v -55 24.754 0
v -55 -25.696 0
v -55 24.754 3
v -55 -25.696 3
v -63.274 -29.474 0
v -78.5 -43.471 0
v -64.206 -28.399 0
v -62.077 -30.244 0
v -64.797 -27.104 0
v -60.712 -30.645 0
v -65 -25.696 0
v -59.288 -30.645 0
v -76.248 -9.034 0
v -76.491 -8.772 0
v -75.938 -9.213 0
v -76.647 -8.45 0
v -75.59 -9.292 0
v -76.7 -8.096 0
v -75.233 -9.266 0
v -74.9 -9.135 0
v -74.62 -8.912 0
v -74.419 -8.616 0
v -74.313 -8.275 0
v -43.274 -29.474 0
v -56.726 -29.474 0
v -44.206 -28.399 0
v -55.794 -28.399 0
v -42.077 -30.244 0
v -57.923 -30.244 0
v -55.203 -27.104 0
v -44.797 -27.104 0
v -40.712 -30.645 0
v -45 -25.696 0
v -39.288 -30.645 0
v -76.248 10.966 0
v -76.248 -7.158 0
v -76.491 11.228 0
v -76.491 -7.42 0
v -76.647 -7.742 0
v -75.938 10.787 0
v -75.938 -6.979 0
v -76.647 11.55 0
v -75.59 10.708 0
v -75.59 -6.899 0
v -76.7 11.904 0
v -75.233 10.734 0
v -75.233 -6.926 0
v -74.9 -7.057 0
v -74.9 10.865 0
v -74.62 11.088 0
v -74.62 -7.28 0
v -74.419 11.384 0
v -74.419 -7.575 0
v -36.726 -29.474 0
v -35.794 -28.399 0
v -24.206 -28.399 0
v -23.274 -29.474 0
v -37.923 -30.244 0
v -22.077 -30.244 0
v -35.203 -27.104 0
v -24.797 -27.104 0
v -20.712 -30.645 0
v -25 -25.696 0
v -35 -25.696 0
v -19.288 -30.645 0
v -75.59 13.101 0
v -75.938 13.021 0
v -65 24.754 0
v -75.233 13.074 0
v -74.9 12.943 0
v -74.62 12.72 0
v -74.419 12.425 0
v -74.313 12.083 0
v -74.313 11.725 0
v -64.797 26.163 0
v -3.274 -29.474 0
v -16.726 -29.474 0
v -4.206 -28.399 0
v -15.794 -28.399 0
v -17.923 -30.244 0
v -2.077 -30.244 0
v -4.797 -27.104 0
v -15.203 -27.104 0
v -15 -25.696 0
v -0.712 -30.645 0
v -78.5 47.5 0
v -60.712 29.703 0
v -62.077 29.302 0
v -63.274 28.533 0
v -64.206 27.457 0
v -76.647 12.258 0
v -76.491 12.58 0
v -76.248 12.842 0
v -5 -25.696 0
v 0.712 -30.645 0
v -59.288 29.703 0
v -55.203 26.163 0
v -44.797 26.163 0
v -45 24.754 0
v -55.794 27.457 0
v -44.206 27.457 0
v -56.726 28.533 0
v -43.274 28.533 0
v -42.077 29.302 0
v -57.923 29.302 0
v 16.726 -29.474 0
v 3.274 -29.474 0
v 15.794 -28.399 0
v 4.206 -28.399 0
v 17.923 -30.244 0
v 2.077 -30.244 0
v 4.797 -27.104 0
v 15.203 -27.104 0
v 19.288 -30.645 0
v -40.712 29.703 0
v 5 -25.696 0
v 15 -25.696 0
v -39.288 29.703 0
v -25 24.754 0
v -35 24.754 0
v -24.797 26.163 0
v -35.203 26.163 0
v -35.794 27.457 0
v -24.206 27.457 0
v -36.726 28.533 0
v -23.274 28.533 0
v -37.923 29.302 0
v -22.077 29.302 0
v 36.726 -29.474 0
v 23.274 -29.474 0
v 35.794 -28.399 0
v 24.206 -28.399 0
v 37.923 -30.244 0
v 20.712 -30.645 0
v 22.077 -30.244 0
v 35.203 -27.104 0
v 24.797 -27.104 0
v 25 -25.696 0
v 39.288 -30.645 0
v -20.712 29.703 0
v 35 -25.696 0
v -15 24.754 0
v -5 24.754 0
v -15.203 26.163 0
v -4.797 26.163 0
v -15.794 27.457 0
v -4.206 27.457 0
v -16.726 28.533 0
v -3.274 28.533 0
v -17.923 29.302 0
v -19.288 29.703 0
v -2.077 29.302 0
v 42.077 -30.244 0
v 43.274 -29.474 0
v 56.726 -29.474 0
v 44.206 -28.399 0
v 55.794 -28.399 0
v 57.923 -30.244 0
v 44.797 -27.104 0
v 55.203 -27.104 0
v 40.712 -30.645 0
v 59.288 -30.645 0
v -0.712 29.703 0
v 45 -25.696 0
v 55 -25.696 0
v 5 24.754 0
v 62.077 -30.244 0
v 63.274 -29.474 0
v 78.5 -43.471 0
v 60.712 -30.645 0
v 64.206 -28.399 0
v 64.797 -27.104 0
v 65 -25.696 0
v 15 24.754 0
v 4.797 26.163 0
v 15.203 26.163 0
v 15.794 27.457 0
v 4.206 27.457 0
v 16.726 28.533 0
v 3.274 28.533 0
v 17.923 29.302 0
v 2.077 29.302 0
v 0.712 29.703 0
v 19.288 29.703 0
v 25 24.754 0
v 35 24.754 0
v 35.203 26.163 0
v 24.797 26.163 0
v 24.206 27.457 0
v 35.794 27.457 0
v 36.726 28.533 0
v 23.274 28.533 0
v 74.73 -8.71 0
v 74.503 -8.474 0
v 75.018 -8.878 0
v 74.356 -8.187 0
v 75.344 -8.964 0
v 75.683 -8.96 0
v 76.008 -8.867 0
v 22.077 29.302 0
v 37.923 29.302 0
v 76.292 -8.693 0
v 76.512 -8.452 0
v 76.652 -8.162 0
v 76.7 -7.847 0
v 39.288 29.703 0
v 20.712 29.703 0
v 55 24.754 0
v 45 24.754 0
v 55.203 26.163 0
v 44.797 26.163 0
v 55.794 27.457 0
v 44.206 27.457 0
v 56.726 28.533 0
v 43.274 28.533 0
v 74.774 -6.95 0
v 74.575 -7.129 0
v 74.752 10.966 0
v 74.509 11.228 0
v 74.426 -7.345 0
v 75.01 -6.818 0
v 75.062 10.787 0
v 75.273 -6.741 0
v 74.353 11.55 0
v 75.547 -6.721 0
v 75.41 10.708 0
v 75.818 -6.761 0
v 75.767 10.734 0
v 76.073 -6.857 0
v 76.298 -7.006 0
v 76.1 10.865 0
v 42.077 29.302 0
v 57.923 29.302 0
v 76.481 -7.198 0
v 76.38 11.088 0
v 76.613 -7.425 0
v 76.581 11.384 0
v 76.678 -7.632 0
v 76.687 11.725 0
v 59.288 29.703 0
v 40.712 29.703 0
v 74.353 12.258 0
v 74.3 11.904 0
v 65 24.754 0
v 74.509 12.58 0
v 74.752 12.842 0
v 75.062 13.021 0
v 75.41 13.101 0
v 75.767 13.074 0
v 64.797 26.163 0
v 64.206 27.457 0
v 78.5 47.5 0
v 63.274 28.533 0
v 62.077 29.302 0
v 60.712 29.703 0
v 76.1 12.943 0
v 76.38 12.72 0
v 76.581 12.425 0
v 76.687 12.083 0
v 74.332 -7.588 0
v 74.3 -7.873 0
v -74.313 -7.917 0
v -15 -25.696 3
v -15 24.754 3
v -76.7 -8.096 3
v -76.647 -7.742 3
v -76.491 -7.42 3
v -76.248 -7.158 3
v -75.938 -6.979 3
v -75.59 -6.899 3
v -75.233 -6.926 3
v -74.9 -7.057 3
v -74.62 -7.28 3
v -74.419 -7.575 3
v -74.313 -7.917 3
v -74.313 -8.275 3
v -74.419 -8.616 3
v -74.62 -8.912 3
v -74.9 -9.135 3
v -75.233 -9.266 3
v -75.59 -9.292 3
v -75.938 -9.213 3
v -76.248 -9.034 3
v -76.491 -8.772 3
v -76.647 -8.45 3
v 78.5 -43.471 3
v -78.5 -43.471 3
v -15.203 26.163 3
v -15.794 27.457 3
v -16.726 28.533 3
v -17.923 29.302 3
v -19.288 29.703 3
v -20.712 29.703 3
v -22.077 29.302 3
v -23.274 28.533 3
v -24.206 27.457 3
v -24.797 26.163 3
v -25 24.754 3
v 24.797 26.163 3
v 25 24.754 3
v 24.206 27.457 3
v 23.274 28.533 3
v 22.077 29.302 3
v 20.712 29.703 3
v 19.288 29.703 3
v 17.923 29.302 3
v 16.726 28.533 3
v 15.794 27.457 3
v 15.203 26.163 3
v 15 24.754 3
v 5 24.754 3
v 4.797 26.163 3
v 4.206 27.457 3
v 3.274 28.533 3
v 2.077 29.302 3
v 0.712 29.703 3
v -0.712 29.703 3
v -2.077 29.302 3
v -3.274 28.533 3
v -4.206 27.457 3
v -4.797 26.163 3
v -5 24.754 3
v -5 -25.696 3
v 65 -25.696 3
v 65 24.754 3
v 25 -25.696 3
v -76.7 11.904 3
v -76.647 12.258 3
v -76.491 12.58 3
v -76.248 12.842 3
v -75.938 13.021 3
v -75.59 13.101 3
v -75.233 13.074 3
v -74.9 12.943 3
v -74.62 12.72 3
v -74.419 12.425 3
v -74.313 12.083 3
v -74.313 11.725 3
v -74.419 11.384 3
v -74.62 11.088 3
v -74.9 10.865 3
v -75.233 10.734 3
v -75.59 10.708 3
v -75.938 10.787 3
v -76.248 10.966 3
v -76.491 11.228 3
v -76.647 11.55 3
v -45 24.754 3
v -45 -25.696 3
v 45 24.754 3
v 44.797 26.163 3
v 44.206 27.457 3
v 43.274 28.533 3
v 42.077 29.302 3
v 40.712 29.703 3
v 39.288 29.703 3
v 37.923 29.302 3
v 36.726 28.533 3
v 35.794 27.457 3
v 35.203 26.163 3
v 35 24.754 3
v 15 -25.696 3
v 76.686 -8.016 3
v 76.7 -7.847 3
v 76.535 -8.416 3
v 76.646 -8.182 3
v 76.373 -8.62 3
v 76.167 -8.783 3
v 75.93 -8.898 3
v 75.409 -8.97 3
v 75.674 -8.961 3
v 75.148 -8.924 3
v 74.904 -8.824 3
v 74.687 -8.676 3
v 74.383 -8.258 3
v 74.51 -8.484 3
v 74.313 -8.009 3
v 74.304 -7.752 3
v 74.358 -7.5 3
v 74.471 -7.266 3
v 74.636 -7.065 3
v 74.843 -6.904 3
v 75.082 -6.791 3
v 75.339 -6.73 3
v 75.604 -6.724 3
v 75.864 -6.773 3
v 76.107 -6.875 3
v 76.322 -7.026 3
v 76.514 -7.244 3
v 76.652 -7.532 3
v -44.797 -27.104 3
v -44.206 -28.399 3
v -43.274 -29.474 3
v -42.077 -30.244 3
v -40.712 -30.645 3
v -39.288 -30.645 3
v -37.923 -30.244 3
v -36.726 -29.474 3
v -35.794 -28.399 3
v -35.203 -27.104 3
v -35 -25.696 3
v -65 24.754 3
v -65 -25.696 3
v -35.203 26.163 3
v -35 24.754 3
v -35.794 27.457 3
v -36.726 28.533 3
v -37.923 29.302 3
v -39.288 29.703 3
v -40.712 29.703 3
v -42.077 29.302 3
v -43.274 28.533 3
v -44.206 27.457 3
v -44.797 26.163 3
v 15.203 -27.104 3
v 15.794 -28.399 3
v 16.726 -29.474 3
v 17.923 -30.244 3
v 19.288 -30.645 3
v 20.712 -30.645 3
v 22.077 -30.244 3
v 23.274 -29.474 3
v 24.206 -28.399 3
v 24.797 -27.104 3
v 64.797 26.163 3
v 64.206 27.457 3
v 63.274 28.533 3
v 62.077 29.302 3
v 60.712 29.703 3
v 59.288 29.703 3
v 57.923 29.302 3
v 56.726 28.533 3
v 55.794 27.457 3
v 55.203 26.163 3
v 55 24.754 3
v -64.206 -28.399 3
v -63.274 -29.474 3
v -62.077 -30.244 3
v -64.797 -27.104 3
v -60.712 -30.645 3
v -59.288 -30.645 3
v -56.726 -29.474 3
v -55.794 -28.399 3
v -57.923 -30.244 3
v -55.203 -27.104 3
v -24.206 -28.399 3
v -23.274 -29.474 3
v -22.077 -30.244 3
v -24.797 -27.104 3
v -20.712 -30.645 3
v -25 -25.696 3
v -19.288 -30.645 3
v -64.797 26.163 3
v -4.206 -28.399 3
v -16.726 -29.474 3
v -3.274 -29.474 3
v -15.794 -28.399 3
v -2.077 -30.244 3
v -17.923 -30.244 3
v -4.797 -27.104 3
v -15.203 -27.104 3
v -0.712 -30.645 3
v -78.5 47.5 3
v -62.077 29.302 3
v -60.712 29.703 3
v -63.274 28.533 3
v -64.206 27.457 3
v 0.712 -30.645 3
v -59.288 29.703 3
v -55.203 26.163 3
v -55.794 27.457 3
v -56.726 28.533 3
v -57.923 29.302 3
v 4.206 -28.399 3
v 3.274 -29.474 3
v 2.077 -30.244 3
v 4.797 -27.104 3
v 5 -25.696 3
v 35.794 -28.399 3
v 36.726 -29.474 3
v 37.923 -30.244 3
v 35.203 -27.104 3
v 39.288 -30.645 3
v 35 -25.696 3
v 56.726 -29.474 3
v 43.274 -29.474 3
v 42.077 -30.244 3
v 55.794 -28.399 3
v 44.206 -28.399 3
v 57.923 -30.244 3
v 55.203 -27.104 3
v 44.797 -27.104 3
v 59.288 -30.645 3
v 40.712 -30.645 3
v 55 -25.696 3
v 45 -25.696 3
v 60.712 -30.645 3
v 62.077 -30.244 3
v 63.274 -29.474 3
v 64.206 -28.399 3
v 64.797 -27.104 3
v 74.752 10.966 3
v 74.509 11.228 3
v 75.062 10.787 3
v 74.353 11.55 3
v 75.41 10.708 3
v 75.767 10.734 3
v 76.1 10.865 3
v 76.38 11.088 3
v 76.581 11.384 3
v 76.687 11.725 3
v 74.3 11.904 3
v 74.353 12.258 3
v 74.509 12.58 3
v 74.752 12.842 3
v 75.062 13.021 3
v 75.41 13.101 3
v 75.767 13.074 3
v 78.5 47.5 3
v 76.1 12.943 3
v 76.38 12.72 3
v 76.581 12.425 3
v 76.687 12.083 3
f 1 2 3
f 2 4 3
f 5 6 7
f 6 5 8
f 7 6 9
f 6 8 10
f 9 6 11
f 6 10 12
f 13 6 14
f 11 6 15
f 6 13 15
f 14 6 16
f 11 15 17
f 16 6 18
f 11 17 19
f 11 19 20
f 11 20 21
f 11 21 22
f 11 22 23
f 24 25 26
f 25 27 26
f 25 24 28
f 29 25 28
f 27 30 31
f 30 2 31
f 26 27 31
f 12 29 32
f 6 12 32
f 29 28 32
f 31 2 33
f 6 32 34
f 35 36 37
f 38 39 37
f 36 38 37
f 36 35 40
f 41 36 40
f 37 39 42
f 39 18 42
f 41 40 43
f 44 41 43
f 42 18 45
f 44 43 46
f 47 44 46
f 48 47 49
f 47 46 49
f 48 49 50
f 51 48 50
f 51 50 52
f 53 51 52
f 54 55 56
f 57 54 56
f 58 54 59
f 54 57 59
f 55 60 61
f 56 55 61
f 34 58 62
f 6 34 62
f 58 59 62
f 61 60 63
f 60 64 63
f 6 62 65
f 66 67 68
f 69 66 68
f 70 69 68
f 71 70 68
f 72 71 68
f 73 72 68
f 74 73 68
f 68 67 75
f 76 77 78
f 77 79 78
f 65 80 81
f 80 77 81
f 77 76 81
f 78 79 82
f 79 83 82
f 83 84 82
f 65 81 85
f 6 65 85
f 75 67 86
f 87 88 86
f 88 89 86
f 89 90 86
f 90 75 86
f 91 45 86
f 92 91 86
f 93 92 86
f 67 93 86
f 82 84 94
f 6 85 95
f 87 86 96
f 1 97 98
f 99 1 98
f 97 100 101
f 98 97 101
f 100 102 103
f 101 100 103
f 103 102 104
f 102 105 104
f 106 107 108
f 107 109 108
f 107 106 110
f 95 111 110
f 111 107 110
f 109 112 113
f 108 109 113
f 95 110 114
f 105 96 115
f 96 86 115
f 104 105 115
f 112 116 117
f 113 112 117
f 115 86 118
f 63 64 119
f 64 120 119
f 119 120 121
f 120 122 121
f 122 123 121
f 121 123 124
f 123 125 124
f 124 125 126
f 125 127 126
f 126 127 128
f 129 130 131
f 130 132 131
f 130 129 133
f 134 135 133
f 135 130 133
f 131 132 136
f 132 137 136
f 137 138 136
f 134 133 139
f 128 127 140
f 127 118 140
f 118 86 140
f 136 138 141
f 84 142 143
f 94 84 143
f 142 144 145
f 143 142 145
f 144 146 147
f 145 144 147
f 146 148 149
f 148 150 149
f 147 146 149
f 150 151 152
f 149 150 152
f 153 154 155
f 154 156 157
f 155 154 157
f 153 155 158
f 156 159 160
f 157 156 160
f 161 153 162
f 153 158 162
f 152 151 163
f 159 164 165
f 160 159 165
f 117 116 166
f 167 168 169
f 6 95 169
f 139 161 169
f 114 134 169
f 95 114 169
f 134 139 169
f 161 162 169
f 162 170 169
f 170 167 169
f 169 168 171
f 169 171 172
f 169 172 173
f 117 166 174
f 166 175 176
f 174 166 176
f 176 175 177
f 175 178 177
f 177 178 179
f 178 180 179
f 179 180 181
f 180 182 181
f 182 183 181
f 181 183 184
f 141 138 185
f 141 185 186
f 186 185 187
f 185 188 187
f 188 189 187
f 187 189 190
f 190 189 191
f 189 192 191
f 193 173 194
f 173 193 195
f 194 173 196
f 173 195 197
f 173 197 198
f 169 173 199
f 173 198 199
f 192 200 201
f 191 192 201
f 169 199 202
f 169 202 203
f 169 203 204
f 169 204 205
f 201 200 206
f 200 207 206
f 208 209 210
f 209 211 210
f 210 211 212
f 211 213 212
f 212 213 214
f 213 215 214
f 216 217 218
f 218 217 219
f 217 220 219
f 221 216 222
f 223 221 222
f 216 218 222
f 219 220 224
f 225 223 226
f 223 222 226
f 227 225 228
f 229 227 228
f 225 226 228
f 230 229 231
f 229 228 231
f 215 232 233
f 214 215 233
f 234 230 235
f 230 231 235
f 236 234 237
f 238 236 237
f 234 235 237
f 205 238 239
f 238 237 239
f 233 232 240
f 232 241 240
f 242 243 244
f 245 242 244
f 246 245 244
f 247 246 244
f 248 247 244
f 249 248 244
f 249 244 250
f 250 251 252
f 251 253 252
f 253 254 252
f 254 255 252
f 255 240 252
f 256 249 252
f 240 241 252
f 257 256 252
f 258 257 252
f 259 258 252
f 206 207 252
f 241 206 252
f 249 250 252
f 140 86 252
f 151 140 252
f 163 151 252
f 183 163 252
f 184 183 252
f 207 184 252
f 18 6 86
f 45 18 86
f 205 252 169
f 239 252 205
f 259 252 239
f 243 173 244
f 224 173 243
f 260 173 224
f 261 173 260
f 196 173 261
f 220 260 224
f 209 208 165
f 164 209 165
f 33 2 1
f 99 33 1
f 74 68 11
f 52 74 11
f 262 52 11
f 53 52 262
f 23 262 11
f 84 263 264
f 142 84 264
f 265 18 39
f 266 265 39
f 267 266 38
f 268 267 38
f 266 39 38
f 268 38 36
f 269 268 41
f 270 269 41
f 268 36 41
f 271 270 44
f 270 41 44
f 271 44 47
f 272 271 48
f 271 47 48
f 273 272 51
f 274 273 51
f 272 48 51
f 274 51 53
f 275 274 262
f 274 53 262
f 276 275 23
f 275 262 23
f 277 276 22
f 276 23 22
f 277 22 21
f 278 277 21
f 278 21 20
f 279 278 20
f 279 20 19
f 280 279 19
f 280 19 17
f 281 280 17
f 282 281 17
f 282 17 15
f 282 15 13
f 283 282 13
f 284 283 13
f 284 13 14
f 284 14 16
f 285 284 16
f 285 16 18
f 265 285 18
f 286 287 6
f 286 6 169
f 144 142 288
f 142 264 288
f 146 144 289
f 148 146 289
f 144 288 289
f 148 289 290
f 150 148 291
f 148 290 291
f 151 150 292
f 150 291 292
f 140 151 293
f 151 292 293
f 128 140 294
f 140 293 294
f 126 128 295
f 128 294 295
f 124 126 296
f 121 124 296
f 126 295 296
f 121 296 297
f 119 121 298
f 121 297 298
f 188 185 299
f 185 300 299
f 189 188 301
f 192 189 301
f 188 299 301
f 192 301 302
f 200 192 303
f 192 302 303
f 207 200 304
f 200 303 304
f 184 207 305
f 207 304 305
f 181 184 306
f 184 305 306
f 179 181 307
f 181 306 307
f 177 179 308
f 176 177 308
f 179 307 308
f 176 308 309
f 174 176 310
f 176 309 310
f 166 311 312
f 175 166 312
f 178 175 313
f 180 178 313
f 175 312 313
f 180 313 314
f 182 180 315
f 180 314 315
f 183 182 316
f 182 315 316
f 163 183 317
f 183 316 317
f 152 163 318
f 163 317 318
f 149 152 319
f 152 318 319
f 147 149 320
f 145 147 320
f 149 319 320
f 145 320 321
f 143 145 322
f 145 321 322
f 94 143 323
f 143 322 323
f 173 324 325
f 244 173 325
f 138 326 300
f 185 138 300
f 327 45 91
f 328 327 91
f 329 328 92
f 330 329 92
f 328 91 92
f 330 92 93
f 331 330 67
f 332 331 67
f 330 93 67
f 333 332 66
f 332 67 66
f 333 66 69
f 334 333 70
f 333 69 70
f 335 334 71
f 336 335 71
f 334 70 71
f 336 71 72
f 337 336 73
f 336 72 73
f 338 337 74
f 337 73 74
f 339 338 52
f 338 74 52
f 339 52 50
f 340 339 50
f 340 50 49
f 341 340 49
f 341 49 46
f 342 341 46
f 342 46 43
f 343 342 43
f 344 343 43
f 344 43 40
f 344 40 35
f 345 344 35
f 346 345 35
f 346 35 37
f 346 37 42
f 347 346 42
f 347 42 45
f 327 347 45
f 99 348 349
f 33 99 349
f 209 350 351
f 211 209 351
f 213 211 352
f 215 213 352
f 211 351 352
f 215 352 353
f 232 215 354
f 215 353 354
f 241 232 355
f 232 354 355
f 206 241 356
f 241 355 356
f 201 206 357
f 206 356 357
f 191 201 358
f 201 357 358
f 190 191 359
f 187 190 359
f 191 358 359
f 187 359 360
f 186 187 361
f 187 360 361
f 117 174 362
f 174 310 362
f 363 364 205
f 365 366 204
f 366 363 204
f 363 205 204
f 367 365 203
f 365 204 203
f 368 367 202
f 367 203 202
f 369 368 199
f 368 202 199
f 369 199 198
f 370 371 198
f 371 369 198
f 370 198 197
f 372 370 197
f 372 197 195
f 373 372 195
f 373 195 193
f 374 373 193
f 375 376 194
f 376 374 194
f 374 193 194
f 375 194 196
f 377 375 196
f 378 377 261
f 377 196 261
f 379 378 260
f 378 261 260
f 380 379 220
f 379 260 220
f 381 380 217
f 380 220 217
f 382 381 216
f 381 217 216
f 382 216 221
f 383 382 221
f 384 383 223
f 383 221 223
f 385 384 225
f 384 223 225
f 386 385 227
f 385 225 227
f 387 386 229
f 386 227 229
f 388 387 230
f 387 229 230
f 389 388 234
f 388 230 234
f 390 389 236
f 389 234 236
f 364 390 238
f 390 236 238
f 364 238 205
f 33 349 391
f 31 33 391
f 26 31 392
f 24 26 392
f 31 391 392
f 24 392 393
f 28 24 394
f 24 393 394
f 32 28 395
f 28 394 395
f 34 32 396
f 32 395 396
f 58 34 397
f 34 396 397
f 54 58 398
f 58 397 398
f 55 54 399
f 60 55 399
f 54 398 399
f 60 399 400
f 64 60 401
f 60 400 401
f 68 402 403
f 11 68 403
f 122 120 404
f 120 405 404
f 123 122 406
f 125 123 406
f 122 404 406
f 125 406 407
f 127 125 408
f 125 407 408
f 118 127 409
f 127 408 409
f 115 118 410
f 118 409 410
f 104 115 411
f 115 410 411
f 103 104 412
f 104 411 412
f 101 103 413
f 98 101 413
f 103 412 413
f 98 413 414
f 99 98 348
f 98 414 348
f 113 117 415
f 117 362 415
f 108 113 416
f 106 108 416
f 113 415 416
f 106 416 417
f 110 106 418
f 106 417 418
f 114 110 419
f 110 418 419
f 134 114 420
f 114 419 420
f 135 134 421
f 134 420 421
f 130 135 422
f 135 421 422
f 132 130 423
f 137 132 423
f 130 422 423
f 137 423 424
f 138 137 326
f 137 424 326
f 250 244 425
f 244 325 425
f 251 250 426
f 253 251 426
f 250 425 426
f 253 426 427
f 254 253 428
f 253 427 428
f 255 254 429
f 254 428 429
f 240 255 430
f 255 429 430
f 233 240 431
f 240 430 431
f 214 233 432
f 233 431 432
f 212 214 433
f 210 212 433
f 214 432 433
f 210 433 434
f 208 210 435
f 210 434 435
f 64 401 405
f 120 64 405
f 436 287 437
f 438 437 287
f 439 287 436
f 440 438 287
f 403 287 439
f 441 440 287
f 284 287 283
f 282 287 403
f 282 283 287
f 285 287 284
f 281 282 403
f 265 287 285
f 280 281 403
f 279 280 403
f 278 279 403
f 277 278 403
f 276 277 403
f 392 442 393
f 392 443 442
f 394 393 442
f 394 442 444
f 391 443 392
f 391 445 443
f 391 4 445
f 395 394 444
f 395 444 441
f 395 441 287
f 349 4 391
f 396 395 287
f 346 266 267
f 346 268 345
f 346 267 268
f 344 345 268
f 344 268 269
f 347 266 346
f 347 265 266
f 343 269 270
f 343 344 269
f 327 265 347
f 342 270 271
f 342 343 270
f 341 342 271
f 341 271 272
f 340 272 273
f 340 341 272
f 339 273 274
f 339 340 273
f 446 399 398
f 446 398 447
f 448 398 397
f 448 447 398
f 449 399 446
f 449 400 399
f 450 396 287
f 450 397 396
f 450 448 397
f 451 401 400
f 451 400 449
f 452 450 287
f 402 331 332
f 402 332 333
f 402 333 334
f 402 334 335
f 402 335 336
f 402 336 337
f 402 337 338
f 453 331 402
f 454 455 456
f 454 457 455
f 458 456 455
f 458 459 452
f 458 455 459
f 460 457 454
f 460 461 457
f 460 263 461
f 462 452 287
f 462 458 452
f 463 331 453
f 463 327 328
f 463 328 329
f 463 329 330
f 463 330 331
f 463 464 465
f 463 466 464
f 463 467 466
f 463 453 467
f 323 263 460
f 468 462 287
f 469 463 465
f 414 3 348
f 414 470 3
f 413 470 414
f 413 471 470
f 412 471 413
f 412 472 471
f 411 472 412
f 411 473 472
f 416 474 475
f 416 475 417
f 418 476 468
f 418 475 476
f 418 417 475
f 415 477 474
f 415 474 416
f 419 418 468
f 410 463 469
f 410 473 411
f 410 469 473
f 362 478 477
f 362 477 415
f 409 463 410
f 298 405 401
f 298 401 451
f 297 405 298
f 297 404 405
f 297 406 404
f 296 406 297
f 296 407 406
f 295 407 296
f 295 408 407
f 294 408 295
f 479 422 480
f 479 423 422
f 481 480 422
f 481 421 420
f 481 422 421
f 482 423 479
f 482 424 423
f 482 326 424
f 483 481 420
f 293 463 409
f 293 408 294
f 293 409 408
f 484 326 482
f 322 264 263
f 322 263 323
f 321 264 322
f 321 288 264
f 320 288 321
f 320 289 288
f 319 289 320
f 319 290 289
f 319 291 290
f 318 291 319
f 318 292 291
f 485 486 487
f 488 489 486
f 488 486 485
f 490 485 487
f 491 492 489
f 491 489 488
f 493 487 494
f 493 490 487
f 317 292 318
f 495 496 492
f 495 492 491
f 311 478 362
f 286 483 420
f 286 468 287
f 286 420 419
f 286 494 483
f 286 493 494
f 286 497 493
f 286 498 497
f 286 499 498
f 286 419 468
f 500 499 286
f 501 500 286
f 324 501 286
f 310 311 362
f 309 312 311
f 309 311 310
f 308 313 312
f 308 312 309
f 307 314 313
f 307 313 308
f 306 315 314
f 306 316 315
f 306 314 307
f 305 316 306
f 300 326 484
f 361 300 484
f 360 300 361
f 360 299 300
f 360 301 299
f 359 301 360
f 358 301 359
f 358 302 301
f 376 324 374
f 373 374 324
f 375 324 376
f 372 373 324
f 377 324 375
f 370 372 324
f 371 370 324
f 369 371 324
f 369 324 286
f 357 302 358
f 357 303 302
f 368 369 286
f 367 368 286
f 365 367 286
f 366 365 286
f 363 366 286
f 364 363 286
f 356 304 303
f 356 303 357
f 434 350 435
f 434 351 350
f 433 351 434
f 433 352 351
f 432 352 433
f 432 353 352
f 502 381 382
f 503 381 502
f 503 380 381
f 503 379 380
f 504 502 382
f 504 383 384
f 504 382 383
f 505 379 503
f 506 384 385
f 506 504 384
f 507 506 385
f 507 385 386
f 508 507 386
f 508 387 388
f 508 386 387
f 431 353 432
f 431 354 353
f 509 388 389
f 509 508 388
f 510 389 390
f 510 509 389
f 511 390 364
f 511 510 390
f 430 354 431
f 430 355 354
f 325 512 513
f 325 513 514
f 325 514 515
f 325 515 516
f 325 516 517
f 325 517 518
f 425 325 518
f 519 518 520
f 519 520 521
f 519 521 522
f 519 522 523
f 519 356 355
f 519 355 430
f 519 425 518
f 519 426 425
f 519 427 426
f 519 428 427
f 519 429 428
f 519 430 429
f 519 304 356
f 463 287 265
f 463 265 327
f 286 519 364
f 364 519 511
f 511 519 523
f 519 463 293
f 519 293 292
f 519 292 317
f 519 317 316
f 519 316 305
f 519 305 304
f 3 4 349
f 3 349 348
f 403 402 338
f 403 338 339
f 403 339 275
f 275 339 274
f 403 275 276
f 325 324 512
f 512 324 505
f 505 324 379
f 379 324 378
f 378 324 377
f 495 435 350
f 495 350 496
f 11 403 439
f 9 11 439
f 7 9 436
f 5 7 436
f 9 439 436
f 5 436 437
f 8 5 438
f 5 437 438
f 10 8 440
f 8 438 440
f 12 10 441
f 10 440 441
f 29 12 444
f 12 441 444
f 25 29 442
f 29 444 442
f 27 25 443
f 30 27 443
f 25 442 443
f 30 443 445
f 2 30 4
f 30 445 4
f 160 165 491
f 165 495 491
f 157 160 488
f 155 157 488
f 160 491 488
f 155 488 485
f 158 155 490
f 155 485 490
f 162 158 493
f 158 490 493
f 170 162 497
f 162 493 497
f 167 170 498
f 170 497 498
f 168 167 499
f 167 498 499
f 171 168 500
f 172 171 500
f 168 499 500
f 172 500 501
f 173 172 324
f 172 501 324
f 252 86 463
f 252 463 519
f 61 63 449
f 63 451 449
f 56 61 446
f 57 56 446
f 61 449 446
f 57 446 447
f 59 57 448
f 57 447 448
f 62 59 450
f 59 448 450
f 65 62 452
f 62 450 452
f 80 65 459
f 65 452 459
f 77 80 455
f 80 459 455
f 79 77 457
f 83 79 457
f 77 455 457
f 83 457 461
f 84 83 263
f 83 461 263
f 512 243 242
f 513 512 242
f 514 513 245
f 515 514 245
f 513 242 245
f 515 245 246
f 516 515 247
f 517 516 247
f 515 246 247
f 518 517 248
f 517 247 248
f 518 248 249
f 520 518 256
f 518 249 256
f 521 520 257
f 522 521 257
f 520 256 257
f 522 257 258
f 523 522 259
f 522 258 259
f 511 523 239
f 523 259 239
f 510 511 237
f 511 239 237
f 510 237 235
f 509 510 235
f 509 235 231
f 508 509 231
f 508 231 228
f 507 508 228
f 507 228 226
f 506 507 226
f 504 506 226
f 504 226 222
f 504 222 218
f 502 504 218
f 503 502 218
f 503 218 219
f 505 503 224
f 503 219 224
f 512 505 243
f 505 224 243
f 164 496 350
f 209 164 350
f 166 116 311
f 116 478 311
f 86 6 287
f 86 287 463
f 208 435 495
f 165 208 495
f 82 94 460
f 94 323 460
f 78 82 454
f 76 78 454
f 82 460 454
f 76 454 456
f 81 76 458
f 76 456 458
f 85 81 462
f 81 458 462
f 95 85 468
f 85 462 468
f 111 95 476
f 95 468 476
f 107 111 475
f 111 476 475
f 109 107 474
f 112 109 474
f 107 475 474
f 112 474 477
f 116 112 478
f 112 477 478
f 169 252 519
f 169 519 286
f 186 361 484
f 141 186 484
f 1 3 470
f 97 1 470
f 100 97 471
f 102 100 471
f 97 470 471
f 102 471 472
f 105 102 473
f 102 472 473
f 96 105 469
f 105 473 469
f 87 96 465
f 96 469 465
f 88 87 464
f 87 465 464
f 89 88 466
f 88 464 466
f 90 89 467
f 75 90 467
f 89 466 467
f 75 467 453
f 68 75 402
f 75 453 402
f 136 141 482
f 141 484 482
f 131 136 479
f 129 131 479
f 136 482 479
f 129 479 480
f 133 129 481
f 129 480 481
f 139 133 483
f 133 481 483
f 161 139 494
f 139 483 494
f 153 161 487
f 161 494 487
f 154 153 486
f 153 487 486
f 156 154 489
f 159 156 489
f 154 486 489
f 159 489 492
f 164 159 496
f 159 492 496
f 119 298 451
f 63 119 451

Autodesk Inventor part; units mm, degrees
ref_plane "YZ Plane" through (0, 0, 0) normal (1, 0, 0) x (0, 1, 0)
ref_plane "XZ Plane" through (0, 0, 0) normal (0, 1, 0) x (-1, 0, 0)
ref_plane "XY Plane" through (0, 0, 0) normal (0, 0, 1) x (1, 0, 0)
sketch "草图1" plane through (0, 0, 0) normal (0, 0, 1) x (1, 0, 0)
  line L0 (78.5, -47.5) -> (-78.5, -47.5)
  line L1 (-78.5, -47.5) -> (-78.5, 47.5)
  line L2 (-78.5, 47.5) -> (78.5, 47.5)
  line L3 (78.5, 47.5) -> (78.5, -47.5)
  line L4 (78.5, -47.5) -> (-78.5, 47.5) construction
  line L5 (-78.5, -47.5) -> (78.5, 47.5) construction
  point P0 (0, 0)
  dimension "d1" = 157
  dimension "d5" = 95
extrude "拉伸1" add sketch "草图1" along normal blind 3
sketch "草图2" plane through (0, 0, 3) normal (0, 0, 1) x (1, 0, 0)
  point P0 (0, 0)
sketch "草图3" plane through (0, 0, 3) normal (0, 0, 1) x (1, 0, 0)
  line L0 (-79.9462, -43.4706) -> (81.0538, -43.4706)
  line L1 (78.5, 47.5) -> (-78.5, 47.5) projected
  line L2 (-78.5, 47.5) -> (-78.5, -47.5) projected
  line L3 (-78.5, -47.5) -> (78.5, -47.5) projected
  line L4 (78.5, -47.5) -> (78.5, 47.5) projected
  point P0 (0, 0)
  point P1 (78.5, -43.4706)
  point P2 (-78.5, -43.4706)
extrude "拉伸2" cut sketch "草图3" against normal blind 10 contours L0 L4 L3 L2
sketch "草图4" plane through (0, 0, 0) normal (0, 0, -1) x (-1, 0, 0)
  circle A0 centre (-75.5, 11.9042) radius 1.2 projected
  ellipse E0 centre (-75.5, -7.8467) end of major axis (-76.7, -7.8467) minor radius 1.1265 projected
  circle A1 centre (75.5, 11.9042) radius 1.2 projected
  circle A2 centre (75.5, -8.0958) radius 1.2 projected
  point P0 (0, 0)
extrude "拉伸3" cut sketch "草图4" against normal blind 10
sketch "草图5" plane through (0, 0, 3) normal (0, 0, 1) x (1, 0, 0)
  line L0 (-60, 24.7542) -> (-60, -25.6955) construction
  line L1 (-65, 24.7542) -> (-65, -25.6955)
  line L2 (-55, -25.6955) -> (-55, 24.7542)
  arc A0 (-55, 24.7542) -> (-65, 24.7542) centre (-60, 24.7542) ccw
  arc A1 (-65, -25.6955) -> (-55, -25.6955) centre (-60, -25.6955) ccw
  line L3 (-78.5, -43.4706) -> (78.5, -43.4706) projected
  line L4 (-40, 24.7542) -> (-40, -25.6955) construction
  line L5 (-45, 24.7542) -> (-45, -25.6955)
  line L6 (-35, -25.6955) -> (-35, 24.7542)
  arc A2 (-35, 24.7542) -> (-45, 24.7542) centre (-40, 24.7542) ccw
  arc A3 (-45, -25.6955) -> (-35, -25.6955) centre (-40, -25.6955) ccw
  line L7 (-20, 24.7542) -> (-20, -25.6955) construction
  line L8 (-25, 24.7542) -> (-25, -25.6955)
  line L9 (-15, -25.6955) -> (-15, 24.7542)
  arc A4 (-15, 24.7542) -> (-25, 24.7542) centre (-20, 24.7542) ccw
  arc A5 (-25, -25.6955) -> (-15, -25.6955) centre (-20, -25.6955) ccw
  line L10 (0, 24.7542) -> (0, -25.6955) construction
  line L11 (-5, 24.7542) -> (-5, -25.6955)
  line L12 (5, -25.6955) -> (5, 24.7542)
  arc A6 (5, 24.7542) -> (-5, 24.7542) centre (0, 24.7542) ccw
  arc A7 (-5, -25.6955) -> (5, -25.6955) centre (0, -25.6955) ccw
  line L13 (20, 24.7542) -> (20, -25.6955) construction
  line L14 (15, 24.7542) -> (15, -25.6955)
  line L15 (25, -25.6955) -> (25, 24.7542)
  arc A8 (25, 24.7542) -> (15, 24.7542) centre (20, 24.7542) ccw
  arc A9 (15, -25.6955) -> (25, -25.6955) centre (20, -25.6955) ccw
  line L16 (40, 24.7542) -> (40, -25.6955) construction
  line L17 (35, 24.7542) -> (35, -25.6955)
  line L18 (45, -25.6955) -> (45, 24.7542)
  arc A10 (45, 24.7542) -> (35, 24.7542) centre (40, 24.7542) ccw
  arc A11 (35, -25.6955) -> (45, -25.6955) centre (40, -25.6955) ccw
  line L19 (60, 24.7542) -> (60, -25.6955) construction
  line L20 (55, 24.7542) -> (55, -25.6955)
  line L21 (65, -25.6955) -> (65, 24.7542)
  arc A12 (65, 24.7542) -> (55, 24.7542) centre (60, 24.7542) ccw
  arc A13 (55, -25.6955) -> (65, -25.6955) centre (60, -25.6955) ccw
  line L22 (80, 24.7542) -> (80, -25.6955) construction
  line L23 (75, 24.7542) -> (75, -25.6955)
  line L24 (85, -25.6955) -> (85, 24.7542)
  arc A14 (85, 24.7542) -> (75, 24.7542) centre (80, 24.7542) ccw
  arc A15 (75, -25.6955) -> (85, -25.6955) centre (80, -25.6955) ccw
  line L25 (100, 24.7542) -> (100, -25.6955) construction
  line L26 (95, 24.7542) -> (95, -25.6955)
  line L27 (105, -25.6955) -> (105, 24.7542)
  arc A16 (105, 24.7542) -> (95, 24.7542) centre (100, 24.7542) ccw
  arc A17 (95, -25.6955) -> (105, -25.6955) centre (100, -25.6955) ccw
  line L28 (120, 24.7542) -> (120, -25.6955) construction
  line L29 (115, 24.7542) -> (115, -25.6955)
  line L30 (125, -25.6955) -> (125, 24.7542)
  arc A18 (125, 24.7542) -> (115, 24.7542) centre (120, 24.7542) ccw
  arc A19 (115, -25.6955) -> (125, -25.6955) centre (120, -25.6955) ccw
  line L31 (-78.5, 47.5) -> (-78.5, -43.4706) projected
  line L32 (78.5, -43.4706) -> (78.5, 47.5) projected
  point P0 (0, 0)
  point P1 (-60, -0.4706)
  point P2 (-40, -0.4706)
  point P3 (-20, -0.4706)
  point P4 (0, -0.4706)
  point P5 (20, -0.4706)
  point P6 (40, -0.4706)
  point P7 (60, -0.4706)
  point P8 (80, -0.4706)
  point P9 (100, -0.4706)
  point P10 (120, -0.4706)
  dimension "d10" = 10
  dimension "d11" = 43
  dimension "d17" = 20
  dimension "d21" = 13.5
  dimension "d22" = 13.5
extrude "拉伸4" cut sketch "草图5" against normal blind 73.5 contours A0 L2 A1 L1 | A2 L6 A3 L5 | A4 L9 A5 L8 | A6 L12 A7 L11 | A8 L15 A9 L14 | A10 L18 A11 L17 | A12 L21 A13 L20
properties part number "后板3"
